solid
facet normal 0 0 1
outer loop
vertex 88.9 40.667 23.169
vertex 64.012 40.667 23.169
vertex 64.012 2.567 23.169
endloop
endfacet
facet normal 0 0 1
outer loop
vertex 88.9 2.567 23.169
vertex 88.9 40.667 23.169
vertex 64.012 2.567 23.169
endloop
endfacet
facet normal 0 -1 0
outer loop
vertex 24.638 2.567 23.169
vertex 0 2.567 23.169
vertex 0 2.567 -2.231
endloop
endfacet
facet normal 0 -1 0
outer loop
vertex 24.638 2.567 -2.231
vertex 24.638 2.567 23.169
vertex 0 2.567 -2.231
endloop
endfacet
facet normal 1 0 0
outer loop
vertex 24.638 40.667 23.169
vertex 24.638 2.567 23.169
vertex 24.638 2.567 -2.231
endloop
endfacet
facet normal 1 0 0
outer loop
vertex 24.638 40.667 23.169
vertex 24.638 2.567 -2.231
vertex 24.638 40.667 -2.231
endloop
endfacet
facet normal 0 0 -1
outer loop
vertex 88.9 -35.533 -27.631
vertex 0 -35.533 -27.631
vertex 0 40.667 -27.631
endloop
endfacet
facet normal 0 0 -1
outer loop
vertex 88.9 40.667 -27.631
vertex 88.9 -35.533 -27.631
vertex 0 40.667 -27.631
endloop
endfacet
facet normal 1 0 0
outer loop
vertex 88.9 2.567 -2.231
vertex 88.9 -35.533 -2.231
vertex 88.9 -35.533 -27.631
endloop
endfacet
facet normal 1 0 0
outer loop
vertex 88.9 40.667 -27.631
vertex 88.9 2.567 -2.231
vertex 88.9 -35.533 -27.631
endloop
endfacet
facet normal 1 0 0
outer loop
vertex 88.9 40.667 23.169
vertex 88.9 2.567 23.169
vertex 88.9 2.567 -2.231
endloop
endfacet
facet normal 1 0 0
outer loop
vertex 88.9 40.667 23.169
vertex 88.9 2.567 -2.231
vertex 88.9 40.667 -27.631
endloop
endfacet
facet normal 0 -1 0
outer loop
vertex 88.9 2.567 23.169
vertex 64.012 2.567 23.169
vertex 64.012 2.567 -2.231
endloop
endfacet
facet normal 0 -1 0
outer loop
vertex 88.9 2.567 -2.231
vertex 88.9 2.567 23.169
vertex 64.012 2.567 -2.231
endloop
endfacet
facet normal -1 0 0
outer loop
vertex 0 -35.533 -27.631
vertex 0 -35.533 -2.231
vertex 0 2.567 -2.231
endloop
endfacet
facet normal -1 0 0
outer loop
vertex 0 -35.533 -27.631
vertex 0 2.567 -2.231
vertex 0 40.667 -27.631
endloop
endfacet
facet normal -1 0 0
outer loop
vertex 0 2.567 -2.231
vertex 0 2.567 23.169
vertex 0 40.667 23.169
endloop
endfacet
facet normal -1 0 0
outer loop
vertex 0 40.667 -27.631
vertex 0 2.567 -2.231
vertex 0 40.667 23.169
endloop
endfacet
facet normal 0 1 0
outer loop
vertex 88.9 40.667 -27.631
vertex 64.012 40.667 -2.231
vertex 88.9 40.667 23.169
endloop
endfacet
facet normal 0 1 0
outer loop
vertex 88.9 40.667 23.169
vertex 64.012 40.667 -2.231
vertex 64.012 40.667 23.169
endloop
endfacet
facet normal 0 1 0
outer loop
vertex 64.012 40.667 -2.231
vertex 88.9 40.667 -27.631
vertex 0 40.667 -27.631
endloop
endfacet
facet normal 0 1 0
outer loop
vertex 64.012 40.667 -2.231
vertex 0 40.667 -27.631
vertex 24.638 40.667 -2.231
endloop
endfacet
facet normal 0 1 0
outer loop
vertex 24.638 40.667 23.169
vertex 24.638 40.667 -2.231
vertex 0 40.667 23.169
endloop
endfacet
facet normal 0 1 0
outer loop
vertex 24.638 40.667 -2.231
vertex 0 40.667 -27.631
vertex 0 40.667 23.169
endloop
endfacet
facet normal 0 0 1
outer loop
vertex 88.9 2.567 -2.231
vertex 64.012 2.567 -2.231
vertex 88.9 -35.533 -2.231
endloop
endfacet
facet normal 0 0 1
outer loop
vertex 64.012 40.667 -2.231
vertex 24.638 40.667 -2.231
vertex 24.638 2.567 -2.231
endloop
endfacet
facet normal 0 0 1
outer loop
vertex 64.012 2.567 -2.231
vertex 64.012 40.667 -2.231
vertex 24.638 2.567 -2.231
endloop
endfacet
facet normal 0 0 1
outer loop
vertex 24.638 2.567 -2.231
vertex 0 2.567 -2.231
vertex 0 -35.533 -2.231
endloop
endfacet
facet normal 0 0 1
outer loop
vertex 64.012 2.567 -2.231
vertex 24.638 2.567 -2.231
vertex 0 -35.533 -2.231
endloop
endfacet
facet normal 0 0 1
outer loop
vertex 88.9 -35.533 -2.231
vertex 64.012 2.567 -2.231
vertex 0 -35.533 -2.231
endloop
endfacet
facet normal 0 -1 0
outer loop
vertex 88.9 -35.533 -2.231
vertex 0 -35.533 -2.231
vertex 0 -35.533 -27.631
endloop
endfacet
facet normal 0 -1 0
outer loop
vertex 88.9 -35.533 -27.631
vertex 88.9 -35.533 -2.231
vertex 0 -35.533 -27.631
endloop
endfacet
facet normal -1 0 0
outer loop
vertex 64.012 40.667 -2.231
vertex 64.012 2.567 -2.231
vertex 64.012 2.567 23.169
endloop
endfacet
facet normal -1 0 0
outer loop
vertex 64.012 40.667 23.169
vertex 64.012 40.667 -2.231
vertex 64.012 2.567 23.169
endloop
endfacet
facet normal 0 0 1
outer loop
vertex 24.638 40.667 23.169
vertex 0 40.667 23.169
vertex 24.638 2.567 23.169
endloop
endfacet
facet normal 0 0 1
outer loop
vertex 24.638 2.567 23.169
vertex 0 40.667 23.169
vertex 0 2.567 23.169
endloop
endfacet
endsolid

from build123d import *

# Parameters (mm, degrees)
F1_DEPTH  = 88.9
F2_W      = 19.562296
F2_H      = 25.4
F3_DEPTH  = 38.101
F3_FACE_W = 38.1
F3_FACE_H = 25.4
F4_DEPTH  = 19.812


with BuildPart() as f1:
    # F0 (on Right) → F1 (new body)
    with BuildSketch(Plane.YZ):
        Polygon((-35.532832, -2.230505), (-35.532832, -27.630505), (40.667168, -27.630505), (40.667168, 23.169495), (2.567168, 23.169495), (2.567168, -2.230505), align=None)
    extrude(amount=F1_DEPTH)

    # F2 (on face) → F3 (cut, through all)
    with BuildSketch(Plane.XZ.offset(-2.567168)):
        with Locations((54.231148, 10.469495)):
            Rectangle(F2_W, F2_H)
    extrude(amount=-F3_DEPTH, mode=Mode.SUBTRACT)

    # F3_face (on face) → F4 (cut)
    with BuildSketch(Plane(origin=(44.45, 21.617168, 10.469495), x_dir=(0, 1, 0), z_dir=(1, 0, 0))):
        Rectangle(F3_FACE_W, F3_FACE_H)
    extrude(amount=-F4_DEPTH, mode=Mode.SUBTRACT)


solid = f1.part
